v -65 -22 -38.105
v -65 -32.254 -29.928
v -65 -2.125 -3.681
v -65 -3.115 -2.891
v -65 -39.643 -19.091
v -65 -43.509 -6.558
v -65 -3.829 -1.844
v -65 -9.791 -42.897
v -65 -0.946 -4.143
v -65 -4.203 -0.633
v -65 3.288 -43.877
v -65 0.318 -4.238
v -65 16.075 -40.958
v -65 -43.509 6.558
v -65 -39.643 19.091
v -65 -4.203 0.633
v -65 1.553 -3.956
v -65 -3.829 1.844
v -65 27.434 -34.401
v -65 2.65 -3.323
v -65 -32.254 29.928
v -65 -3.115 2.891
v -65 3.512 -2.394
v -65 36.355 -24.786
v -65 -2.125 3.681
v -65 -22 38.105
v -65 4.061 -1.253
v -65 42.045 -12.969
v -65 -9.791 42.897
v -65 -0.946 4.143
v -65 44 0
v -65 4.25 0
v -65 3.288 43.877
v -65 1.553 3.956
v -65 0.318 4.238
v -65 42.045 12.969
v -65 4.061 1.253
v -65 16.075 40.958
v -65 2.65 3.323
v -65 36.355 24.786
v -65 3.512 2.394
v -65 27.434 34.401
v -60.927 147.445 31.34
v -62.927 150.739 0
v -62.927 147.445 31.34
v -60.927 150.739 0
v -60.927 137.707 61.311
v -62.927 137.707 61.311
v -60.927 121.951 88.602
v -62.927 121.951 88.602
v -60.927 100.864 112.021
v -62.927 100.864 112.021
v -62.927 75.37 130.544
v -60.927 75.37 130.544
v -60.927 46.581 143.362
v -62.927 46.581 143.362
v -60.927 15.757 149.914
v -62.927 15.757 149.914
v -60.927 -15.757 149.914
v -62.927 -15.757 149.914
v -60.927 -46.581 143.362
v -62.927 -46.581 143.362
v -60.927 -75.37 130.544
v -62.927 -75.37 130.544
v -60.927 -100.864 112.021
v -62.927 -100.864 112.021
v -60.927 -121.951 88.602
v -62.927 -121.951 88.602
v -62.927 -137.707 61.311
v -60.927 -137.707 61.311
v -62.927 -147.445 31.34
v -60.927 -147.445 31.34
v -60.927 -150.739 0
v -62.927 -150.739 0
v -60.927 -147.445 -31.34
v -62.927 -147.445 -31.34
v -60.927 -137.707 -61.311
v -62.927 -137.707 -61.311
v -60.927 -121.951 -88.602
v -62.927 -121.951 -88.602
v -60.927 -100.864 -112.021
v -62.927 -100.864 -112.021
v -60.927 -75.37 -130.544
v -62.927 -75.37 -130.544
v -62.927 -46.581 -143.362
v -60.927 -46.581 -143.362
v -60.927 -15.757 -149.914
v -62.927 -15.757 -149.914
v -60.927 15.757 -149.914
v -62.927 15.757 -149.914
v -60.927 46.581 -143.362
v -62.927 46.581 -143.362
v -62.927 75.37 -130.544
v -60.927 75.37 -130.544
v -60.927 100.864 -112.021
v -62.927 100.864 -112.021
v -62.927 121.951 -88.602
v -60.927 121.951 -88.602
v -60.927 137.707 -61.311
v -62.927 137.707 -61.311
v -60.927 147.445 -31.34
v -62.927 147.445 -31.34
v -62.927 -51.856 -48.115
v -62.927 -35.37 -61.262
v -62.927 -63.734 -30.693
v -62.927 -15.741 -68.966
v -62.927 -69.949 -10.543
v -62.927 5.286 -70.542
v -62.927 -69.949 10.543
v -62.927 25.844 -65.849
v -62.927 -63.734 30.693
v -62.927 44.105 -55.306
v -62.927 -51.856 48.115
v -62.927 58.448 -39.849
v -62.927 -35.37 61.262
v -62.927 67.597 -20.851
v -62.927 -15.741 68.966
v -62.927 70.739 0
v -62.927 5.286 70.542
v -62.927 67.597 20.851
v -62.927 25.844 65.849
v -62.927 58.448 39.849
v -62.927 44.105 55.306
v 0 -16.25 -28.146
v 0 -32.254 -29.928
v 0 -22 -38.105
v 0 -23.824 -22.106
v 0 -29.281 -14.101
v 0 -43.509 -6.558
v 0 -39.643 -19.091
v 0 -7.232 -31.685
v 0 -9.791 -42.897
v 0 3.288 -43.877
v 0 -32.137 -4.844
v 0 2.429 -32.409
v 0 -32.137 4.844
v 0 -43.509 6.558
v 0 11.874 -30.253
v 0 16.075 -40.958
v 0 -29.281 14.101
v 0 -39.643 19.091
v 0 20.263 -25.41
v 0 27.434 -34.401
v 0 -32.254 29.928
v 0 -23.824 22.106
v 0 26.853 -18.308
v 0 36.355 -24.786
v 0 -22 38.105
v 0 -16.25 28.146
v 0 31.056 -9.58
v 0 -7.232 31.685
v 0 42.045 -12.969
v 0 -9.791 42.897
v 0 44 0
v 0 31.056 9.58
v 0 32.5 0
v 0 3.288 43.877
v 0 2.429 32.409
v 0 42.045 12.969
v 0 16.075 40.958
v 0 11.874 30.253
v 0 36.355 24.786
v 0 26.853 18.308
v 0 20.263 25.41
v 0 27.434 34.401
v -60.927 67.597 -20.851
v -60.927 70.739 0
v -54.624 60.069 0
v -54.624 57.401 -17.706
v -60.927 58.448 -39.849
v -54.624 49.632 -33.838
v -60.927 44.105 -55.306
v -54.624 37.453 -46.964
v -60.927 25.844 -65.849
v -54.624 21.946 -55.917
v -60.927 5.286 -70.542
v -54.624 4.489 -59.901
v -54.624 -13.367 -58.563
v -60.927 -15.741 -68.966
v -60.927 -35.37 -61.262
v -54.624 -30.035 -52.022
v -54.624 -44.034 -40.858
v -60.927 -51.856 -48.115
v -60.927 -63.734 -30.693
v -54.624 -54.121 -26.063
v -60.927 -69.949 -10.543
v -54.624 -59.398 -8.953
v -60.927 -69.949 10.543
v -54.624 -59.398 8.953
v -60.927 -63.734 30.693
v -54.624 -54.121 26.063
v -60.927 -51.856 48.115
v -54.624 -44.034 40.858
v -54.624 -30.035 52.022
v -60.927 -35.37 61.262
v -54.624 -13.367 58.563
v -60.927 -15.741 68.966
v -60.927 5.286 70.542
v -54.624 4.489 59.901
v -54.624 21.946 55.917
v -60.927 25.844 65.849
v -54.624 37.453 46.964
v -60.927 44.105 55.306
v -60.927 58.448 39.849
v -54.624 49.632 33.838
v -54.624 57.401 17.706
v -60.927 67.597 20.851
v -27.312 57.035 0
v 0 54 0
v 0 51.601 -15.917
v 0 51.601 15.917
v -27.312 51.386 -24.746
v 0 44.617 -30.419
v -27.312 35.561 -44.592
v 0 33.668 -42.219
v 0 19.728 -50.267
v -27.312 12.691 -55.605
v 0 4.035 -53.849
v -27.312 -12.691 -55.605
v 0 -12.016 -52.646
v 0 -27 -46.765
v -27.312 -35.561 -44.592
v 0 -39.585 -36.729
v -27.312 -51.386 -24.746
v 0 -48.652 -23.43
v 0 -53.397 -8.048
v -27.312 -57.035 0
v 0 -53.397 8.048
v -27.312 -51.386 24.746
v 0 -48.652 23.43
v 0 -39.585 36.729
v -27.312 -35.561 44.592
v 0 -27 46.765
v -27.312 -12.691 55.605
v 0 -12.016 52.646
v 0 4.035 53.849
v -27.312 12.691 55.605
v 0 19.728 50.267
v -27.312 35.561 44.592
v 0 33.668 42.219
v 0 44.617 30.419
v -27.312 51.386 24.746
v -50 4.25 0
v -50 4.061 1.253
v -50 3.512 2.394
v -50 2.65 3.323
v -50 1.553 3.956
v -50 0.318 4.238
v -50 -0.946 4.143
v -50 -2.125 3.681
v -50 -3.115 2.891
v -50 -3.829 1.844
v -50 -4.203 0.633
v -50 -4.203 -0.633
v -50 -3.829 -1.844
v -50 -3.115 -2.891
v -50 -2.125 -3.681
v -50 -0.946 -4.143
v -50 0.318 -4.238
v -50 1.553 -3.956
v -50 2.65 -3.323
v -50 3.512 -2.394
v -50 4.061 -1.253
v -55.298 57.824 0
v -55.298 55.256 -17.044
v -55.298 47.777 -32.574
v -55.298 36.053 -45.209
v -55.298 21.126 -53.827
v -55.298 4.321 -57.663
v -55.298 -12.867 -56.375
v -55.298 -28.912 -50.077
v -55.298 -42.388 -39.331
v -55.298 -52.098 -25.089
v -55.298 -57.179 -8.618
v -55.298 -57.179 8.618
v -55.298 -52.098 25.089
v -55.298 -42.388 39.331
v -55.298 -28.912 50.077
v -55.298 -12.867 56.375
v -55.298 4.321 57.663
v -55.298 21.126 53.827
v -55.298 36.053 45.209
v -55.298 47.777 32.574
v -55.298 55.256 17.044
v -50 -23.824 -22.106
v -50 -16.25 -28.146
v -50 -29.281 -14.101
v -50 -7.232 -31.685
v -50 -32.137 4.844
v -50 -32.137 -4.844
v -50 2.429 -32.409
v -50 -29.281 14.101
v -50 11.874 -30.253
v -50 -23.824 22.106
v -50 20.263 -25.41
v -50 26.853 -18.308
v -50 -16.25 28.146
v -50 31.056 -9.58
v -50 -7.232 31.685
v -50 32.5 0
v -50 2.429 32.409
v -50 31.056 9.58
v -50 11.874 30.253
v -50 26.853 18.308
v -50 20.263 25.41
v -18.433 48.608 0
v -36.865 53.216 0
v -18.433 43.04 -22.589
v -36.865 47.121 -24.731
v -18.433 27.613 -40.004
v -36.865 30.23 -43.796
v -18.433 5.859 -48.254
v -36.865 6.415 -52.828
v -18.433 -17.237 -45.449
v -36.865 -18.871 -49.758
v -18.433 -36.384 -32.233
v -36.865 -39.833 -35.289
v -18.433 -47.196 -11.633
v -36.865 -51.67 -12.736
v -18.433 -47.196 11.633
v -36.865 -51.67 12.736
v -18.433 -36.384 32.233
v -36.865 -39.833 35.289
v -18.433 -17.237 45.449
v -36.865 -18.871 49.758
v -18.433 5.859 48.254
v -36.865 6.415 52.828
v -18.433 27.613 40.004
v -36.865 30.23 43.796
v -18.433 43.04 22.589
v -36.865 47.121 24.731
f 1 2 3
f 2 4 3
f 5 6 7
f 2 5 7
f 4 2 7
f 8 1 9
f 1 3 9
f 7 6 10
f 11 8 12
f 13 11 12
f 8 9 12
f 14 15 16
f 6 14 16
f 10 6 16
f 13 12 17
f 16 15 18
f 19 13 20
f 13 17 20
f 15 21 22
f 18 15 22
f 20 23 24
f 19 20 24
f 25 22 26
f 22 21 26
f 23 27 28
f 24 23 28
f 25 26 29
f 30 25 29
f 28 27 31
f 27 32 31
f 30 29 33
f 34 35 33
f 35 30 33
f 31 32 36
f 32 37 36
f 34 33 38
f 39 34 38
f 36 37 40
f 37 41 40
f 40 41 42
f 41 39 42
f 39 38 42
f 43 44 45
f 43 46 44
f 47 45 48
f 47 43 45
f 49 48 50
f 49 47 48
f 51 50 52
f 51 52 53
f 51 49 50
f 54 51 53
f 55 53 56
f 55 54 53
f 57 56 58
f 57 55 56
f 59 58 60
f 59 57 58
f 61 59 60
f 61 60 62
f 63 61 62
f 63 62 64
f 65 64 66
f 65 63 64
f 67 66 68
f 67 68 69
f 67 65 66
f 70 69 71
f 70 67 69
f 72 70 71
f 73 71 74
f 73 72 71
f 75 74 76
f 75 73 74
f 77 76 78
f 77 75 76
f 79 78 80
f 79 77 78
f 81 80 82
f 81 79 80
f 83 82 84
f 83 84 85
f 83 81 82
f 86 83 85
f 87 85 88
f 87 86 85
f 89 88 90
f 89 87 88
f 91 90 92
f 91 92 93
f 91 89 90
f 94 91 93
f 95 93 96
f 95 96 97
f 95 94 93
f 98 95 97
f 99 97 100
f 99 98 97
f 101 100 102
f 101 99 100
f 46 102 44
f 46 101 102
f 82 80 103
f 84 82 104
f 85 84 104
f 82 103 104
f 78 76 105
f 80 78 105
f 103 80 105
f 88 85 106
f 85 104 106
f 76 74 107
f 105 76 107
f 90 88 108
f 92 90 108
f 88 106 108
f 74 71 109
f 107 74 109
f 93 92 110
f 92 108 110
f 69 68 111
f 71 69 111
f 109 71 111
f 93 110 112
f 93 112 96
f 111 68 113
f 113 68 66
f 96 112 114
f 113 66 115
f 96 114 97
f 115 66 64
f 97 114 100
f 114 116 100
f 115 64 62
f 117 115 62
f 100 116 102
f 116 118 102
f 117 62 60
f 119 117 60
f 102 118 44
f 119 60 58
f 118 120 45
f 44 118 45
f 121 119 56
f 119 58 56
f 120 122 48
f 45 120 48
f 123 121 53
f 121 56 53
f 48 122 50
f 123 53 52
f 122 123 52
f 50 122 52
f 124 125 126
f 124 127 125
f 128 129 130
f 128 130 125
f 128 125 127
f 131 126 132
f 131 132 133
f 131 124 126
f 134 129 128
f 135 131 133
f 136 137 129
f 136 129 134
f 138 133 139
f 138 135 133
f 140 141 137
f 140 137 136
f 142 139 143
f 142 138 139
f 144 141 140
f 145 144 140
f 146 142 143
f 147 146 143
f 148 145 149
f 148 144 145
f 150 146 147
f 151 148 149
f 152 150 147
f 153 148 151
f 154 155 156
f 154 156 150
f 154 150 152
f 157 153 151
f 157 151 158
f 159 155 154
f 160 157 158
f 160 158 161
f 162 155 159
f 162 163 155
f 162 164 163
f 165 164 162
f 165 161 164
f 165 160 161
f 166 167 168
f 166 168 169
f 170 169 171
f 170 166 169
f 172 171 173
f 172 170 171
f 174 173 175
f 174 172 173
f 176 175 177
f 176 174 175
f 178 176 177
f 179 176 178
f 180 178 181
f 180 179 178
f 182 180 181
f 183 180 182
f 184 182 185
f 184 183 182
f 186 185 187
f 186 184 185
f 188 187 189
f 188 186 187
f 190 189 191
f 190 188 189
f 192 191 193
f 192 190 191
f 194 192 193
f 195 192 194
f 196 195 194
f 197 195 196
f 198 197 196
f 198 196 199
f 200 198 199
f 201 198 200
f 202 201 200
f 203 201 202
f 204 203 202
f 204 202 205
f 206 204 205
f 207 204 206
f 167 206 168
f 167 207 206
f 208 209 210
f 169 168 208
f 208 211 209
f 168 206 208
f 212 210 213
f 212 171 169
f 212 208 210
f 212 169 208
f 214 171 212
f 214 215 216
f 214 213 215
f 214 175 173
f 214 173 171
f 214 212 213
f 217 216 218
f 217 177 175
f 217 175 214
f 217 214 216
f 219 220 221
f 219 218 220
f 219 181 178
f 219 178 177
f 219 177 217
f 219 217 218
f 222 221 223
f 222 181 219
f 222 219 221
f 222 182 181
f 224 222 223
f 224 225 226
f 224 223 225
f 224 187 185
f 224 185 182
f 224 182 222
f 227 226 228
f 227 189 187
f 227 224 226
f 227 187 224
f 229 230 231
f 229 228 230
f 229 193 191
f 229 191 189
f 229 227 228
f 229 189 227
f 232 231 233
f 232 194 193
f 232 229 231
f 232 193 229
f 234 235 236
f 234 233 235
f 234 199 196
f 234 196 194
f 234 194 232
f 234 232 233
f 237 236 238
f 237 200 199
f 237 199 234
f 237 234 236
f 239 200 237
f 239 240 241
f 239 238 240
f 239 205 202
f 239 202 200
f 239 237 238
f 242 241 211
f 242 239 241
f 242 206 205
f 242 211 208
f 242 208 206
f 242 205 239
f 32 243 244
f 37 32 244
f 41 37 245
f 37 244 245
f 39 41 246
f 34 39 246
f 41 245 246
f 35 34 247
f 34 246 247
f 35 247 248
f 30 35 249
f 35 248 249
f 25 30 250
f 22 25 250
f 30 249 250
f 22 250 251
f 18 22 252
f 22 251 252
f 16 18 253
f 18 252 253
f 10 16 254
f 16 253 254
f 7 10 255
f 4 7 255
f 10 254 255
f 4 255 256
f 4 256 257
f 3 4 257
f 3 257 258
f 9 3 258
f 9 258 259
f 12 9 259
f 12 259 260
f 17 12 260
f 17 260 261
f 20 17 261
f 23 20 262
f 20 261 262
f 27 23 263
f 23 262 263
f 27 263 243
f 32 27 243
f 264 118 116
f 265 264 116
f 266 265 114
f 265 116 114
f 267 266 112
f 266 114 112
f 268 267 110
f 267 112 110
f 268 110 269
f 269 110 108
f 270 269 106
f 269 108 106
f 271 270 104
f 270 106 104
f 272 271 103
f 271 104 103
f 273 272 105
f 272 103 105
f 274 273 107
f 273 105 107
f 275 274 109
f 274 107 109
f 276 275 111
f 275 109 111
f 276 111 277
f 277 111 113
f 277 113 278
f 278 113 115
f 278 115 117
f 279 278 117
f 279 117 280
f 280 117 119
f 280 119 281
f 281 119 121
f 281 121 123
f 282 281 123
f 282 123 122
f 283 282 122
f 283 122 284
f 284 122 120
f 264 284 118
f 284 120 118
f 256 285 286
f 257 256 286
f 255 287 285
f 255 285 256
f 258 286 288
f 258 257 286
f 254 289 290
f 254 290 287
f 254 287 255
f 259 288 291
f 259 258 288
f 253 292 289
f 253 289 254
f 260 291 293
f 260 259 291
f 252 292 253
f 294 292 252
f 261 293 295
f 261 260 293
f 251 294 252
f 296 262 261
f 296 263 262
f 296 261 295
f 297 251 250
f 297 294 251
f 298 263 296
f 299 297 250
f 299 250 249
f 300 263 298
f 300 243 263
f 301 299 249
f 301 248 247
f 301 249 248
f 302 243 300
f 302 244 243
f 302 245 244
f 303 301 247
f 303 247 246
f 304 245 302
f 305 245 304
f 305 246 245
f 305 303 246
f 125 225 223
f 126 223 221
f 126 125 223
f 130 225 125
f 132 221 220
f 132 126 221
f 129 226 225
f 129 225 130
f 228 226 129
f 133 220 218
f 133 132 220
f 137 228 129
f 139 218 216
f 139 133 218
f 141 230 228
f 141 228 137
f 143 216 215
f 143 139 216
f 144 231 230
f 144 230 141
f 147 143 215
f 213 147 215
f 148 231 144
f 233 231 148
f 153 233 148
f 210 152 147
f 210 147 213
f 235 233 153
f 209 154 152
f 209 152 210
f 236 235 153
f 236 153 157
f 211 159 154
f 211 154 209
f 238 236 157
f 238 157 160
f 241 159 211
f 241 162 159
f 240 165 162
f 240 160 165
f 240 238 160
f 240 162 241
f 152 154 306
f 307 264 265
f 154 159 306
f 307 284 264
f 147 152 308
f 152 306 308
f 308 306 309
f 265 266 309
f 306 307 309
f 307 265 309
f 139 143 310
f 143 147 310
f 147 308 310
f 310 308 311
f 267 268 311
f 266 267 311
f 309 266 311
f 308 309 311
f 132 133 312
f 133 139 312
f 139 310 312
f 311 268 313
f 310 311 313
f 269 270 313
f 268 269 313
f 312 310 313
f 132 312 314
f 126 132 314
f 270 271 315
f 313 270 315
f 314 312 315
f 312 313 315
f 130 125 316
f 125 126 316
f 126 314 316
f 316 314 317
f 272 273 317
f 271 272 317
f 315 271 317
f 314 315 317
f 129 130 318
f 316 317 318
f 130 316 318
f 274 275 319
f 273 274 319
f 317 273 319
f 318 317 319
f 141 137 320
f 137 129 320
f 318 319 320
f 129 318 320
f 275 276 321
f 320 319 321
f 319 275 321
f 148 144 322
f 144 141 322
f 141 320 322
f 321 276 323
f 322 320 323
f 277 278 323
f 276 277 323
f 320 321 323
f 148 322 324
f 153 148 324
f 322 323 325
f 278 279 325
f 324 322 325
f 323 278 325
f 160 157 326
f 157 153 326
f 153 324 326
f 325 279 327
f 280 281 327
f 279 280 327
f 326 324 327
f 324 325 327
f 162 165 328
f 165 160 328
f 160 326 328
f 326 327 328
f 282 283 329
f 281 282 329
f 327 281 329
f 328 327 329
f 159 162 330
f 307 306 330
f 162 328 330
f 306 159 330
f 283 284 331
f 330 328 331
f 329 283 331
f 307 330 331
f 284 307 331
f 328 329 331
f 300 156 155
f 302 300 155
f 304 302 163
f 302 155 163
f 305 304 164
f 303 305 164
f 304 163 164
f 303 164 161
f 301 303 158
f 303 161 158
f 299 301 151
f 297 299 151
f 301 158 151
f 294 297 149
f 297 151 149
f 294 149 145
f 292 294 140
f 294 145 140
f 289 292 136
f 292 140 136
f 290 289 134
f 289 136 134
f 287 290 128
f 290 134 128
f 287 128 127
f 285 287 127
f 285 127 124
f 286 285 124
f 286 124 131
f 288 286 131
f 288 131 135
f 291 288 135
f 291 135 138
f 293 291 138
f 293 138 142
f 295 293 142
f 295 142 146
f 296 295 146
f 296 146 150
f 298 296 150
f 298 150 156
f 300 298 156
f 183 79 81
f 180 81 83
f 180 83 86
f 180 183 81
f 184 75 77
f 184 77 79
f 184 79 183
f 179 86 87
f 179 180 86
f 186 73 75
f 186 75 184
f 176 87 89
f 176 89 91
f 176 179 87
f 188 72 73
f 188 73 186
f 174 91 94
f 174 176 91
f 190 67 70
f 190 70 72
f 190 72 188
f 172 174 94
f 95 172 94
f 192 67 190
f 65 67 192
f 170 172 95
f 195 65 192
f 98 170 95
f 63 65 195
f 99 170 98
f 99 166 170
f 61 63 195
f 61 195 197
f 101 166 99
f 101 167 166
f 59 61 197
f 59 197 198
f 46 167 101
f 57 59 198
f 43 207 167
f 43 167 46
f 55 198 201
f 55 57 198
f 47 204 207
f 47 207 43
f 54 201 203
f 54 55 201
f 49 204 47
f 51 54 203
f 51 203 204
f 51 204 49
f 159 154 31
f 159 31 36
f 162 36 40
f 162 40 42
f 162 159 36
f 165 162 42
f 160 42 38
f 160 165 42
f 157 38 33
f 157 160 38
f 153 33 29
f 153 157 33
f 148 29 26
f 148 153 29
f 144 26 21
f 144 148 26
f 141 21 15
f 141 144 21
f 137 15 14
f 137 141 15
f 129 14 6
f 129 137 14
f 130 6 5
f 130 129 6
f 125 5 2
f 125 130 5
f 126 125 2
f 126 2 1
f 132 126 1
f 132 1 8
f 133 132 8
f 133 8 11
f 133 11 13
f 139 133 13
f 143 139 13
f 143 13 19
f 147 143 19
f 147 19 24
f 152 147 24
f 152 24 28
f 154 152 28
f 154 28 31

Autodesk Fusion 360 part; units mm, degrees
sketch "Boceto1" plane through (0, 0, 0) normal (0, 0, 1) x (1, 0, 0)
  line L0 (0, 44) -> (-55.2981, 57.8245)
  line L1 (-55.2981, 57.8245) -> (-62.9274, 70.7394)
  line L2 (-60.9274, 70.7394) -> (-54.6242, 60.0694)
  line L3 (-54.6242, 60.0694) -> (0, 54)
  line L4 (0, 54) -> (0, 44)
  line L5 (-62.9274, 70.7394) -> (-62.9274, 150.7394)
  line L6 (-62.9274, 150.7394) -> (-60.9274, 150.7394)
  line L7 (-60.9274, 150.7394) -> (-60.9274, 70.7394)
  dimension "d37" = 57
  dimension "d38" = 15
  dimension "d40" = 54.6242
  dimension "d43" = 80
  dimension "d44" = 2
revolve "Revolución1" add sketch "Boceto1" angle 360 about axis through (1.75, 0, 0) along (1, 0, 0) makes body 1
sketch "Boceto5" plane through (0, 0, 0) normal (1, 0, 0) x (0, 1, 0)
  circle A0 centre (0, 0) radius 44
  dimension "d46" = 88
extrude "Extruir1" add sketch "Boceto5" against normal blind 15 separate body makes body 2
extrude "Extruir2" add 1 faces at (-15, 11.6304, -6.1249) along direction (-1, 0, 0) blind 50 on bodies 2 bodies 2
combine "Combinar1" operation add target body 2 tool bodies 1
sketch "Boceto6" plane through (0, 0, 0) normal (1, 0, 0) x (0, 1, 0)
  circle A0 centre (0, 0) radius 32.5
  dimension "d51" = 65
extrude "Extruir3" cut sketch "Boceto6" against normal blind 50 bodies 2
sketch "Boceto7" plane through (-50, 0, 0) normal (1, 0, 0) x (0, 1, 0)
  circle A0 centre (0, 0) radius 32.5
  circle A1 centre (0, 0) radius 4.25
  dimension "d54" = 8.5
extrude "Extruir4" cut sketch "Boceto7" against normal blind 15 contours A1 bodies 2
